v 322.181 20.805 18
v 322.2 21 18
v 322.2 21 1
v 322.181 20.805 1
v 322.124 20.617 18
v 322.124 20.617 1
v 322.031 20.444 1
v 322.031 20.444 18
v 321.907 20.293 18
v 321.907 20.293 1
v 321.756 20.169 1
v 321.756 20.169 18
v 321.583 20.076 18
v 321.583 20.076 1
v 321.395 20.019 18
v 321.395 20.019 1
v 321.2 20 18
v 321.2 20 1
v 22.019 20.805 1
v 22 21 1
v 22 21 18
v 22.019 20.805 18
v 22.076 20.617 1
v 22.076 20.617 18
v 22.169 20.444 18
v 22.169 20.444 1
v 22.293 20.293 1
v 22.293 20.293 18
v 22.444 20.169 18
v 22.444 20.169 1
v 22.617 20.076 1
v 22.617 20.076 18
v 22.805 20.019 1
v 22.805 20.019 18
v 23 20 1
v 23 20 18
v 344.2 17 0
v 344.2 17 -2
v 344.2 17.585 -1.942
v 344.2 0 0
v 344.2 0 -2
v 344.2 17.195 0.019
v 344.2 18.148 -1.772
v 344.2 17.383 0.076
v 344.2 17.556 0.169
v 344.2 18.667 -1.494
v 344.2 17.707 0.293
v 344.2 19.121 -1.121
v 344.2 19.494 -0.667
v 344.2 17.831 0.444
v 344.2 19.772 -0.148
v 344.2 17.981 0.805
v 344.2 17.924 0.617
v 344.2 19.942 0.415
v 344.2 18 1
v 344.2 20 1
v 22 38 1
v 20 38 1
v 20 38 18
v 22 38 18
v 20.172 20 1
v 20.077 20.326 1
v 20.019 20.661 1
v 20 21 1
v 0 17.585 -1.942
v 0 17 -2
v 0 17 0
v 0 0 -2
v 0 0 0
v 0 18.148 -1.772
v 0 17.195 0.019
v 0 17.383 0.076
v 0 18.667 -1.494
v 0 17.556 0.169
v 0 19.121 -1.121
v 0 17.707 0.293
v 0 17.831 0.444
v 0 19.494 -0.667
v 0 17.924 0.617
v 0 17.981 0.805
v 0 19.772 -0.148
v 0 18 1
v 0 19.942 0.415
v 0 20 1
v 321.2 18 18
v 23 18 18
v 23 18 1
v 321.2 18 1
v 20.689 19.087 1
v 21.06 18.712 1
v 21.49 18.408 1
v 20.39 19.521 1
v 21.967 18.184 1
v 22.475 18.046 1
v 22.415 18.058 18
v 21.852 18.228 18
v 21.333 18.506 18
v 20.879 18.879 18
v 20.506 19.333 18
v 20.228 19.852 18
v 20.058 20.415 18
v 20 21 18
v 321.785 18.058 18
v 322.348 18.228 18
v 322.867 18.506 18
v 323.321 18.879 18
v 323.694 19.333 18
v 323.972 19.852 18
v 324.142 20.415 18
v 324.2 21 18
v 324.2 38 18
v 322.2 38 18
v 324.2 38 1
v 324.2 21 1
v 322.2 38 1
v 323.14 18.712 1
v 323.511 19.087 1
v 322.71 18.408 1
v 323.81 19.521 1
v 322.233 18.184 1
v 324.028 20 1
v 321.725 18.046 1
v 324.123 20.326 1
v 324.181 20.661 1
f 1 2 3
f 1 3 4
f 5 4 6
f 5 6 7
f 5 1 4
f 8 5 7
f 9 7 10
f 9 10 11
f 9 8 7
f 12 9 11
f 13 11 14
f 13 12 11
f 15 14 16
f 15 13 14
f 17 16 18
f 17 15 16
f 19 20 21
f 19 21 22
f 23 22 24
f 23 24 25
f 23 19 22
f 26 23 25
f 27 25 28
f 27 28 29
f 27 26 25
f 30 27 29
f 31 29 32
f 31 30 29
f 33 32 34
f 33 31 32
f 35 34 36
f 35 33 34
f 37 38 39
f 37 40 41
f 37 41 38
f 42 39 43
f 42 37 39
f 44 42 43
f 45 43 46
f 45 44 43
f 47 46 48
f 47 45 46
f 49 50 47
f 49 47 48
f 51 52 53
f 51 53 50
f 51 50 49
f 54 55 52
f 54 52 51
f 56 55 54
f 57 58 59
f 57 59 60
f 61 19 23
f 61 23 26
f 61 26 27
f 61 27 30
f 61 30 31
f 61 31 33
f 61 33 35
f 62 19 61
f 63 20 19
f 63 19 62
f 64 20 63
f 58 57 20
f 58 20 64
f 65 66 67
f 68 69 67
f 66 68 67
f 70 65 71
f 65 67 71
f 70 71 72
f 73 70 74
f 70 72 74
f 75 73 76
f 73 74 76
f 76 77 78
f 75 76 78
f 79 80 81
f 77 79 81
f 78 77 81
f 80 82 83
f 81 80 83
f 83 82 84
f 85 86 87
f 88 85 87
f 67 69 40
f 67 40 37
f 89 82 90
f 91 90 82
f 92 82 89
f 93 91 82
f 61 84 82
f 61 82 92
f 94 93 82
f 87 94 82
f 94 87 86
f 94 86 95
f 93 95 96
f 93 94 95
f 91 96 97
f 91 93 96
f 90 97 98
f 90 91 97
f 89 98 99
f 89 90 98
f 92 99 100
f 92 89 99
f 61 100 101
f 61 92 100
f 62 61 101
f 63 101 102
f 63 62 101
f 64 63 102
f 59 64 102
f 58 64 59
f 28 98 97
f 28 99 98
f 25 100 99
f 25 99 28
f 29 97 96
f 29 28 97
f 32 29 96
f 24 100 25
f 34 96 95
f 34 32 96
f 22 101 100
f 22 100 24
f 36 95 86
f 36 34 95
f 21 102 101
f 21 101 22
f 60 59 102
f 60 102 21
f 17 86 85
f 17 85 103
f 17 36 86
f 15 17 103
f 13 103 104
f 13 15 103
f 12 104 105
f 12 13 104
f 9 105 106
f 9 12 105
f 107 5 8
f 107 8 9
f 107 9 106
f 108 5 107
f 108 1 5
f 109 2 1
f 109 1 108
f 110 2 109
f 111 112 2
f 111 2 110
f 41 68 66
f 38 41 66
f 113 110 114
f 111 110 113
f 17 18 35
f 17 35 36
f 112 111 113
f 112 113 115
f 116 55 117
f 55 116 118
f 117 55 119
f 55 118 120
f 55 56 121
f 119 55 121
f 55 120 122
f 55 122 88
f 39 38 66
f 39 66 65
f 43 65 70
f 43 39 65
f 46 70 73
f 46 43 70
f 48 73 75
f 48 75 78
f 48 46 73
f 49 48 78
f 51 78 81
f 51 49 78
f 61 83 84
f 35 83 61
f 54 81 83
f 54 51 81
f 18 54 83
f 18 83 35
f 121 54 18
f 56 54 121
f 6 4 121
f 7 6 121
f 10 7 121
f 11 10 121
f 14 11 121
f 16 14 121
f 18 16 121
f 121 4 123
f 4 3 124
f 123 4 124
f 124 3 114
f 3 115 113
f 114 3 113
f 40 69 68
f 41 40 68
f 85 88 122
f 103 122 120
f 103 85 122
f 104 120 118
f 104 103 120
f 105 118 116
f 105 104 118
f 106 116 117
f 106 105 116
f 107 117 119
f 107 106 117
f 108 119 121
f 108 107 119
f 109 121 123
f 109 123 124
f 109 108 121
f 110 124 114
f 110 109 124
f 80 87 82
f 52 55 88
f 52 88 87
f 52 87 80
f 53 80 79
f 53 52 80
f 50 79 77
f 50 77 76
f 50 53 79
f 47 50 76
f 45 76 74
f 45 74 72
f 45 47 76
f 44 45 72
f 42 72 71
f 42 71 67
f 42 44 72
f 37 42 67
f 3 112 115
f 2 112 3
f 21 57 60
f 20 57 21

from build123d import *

# Parameters (mm, degrees)
SKETCH_1_W                       = 2
SKETCH_1_H                       = 20
EXTRUDE_1_DEPTH                  = 344.2
SM_EDGE_FLANGE_1_STRIP_W         = 10
SM_EDGE_FLANGE_1_STRIP_H         = 2
SM_EDGE_FLANGE_1_STRIP_CUT_DEPTH = 344.2
SM_EDGE_FLANGE_1_DEPTH           = 344.2
SM_EDGE_FLANGE_2_STRIP_W         = 30
SM_EDGE_FLANGE_2_STRIP_H         = 2
SM_EDGE_FLANGE_2_STRIP_CUT_DEPTH = 17
SM_EDGE_FLANGE_2_DEPTH           = 17
SM_EDGE_FLANGE_3_STRIP_W         = 30
SM_EDGE_FLANGE_3_STRIP_H         = 2
SM_EDGE_FLANGE_3_STRIP_CUT_DEPTH = 17
SM_EDGE_FLANGE_3_DEPTH           = 17


# Sheet-metal steps are written as plain solids
with BuildPart() as part:
    # Sketch 1 → Бобышка-Вытянуть1 (new body)
    with BuildSketch(Plane(origin=(0, 0, 0), x_dir=(0, 0, -1), z_dir=(1, 0, 0))):
        with Locations((1, 10)):
            Rectangle(SKETCH_1_W, SKETCH_1_H)
    extrude(amount=EXTRUDE_1_DEPTH)

    # Ребро-кромка1 strip (across the edge) → Ребро-кромка1 strip cut (cut)
    with BuildSketch(Plane(origin=(344.2, 20, 0), x_dir=(0, -1, 0), z_dir=(-1, 0, 0))):
        with Locations((-2, -1)):
            Rectangle(SM_EDGE_FLANGE_1_STRIP_W, SM_EDGE_FLANGE_1_STRIP_H)
    extrude(amount=SM_EDGE_FLANGE_1_STRIP_CUT_DEPTH, mode=Mode.SUBTRACT)

    # Ребро-кромка1 section (across the edge) → Ребро-кромка1 (add)
    with BuildSketch(Plane(origin=(344.2, 20, 0), x_dir=(0, -1, 0), z_dir=(-1, 0, 0))):
        with BuildLine():
            Line((0, 1), (0, 18))
            Line((0, 18), (2, 18))
            Line((2, 18), (2, 1))
            ThreePointArc((2, 1), (2.292893219, 0.292893219), (3, 0))
            Line((3, 0), (3, -2))
            ThreePointArc((3, -2), (0.878679656, -1.121320344), (0, 1))
        make_face()
    extrude(amount=SM_EDGE_FLANGE_1_DEPTH)

    # Ребро-кромка2 strip (across the edge) → Ребро-кромка2 strip cut (cut)
    with BuildSketch(Plane(origin=(20, 20, 1), x_dir=(1, 0, 0), z_dir=(0, 0, 1))):
        with Locations((-12, -1)):
            Rectangle(SM_EDGE_FLANGE_2_STRIP_W, SM_EDGE_FLANGE_2_STRIP_H)
    extrude(amount=SM_EDGE_FLANGE_2_STRIP_CUT_DEPTH, mode=Mode.SUBTRACT)

    # Ребро-кромка2 section (across the edge) → Ребро-кромка2 (add)
    with BuildSketch(Plane(origin=(20, 20, 1), x_dir=(1, 0, 0), z_dir=(0, 0, 1))):
        with BuildLine():
            Line((0, 1), (0, 18))
            Line((0, 18), (2, 18))
            Line((2, 18), (2, 1))
            ThreePointArc((2, 1), (2.292893219, 0.292893219), (3, 0))
            Line((3, 0), (3, -2))
            ThreePointArc((3, -2), (0.878679656, -1.121320344), (0, 1))
        make_face()
    extrude(amount=SM_EDGE_FLANGE_2_DEPTH)

    # Ребро-кромка3 strip (across the edge) → Ребро-кромка3 strip cut (cut)
    with BuildSketch(Plane(origin=(324.2, 20, 18), x_dir=(-1, 0, 0), z_dir=(0, 0, -1))):
        with Locations((-12, -1)):
            Rectangle(SM_EDGE_FLANGE_3_STRIP_W, SM_EDGE_FLANGE_3_STRIP_H)
    extrude(amount=SM_EDGE_FLANGE_3_STRIP_CUT_DEPTH, mode=Mode.SUBTRACT)

    # Ребро-кромка3 section (across the edge) → Ребро-кромка3 (add)
    with BuildSketch(Plane(origin=(324.2, 20, 18), x_dir=(-1, 0, 0), z_dir=(0, 0, -1))):
        with BuildLine():
            Line((0, 1), (0, 18))
            Line((0, 18), (2, 18))
            Line((2, 18), (2, 1))
            ThreePointArc((2, 1), (2.292893219, 0.292893219), (3, 0))
            Line((3, 0), (3, -2))
            ThreePointArc((3, -2), (0.878679656, -1.121320344), (0, 1))
        make_face()
    extrude(amount=SM_EDGE_FLANGE_3_DEPTH)


solid = part.part
